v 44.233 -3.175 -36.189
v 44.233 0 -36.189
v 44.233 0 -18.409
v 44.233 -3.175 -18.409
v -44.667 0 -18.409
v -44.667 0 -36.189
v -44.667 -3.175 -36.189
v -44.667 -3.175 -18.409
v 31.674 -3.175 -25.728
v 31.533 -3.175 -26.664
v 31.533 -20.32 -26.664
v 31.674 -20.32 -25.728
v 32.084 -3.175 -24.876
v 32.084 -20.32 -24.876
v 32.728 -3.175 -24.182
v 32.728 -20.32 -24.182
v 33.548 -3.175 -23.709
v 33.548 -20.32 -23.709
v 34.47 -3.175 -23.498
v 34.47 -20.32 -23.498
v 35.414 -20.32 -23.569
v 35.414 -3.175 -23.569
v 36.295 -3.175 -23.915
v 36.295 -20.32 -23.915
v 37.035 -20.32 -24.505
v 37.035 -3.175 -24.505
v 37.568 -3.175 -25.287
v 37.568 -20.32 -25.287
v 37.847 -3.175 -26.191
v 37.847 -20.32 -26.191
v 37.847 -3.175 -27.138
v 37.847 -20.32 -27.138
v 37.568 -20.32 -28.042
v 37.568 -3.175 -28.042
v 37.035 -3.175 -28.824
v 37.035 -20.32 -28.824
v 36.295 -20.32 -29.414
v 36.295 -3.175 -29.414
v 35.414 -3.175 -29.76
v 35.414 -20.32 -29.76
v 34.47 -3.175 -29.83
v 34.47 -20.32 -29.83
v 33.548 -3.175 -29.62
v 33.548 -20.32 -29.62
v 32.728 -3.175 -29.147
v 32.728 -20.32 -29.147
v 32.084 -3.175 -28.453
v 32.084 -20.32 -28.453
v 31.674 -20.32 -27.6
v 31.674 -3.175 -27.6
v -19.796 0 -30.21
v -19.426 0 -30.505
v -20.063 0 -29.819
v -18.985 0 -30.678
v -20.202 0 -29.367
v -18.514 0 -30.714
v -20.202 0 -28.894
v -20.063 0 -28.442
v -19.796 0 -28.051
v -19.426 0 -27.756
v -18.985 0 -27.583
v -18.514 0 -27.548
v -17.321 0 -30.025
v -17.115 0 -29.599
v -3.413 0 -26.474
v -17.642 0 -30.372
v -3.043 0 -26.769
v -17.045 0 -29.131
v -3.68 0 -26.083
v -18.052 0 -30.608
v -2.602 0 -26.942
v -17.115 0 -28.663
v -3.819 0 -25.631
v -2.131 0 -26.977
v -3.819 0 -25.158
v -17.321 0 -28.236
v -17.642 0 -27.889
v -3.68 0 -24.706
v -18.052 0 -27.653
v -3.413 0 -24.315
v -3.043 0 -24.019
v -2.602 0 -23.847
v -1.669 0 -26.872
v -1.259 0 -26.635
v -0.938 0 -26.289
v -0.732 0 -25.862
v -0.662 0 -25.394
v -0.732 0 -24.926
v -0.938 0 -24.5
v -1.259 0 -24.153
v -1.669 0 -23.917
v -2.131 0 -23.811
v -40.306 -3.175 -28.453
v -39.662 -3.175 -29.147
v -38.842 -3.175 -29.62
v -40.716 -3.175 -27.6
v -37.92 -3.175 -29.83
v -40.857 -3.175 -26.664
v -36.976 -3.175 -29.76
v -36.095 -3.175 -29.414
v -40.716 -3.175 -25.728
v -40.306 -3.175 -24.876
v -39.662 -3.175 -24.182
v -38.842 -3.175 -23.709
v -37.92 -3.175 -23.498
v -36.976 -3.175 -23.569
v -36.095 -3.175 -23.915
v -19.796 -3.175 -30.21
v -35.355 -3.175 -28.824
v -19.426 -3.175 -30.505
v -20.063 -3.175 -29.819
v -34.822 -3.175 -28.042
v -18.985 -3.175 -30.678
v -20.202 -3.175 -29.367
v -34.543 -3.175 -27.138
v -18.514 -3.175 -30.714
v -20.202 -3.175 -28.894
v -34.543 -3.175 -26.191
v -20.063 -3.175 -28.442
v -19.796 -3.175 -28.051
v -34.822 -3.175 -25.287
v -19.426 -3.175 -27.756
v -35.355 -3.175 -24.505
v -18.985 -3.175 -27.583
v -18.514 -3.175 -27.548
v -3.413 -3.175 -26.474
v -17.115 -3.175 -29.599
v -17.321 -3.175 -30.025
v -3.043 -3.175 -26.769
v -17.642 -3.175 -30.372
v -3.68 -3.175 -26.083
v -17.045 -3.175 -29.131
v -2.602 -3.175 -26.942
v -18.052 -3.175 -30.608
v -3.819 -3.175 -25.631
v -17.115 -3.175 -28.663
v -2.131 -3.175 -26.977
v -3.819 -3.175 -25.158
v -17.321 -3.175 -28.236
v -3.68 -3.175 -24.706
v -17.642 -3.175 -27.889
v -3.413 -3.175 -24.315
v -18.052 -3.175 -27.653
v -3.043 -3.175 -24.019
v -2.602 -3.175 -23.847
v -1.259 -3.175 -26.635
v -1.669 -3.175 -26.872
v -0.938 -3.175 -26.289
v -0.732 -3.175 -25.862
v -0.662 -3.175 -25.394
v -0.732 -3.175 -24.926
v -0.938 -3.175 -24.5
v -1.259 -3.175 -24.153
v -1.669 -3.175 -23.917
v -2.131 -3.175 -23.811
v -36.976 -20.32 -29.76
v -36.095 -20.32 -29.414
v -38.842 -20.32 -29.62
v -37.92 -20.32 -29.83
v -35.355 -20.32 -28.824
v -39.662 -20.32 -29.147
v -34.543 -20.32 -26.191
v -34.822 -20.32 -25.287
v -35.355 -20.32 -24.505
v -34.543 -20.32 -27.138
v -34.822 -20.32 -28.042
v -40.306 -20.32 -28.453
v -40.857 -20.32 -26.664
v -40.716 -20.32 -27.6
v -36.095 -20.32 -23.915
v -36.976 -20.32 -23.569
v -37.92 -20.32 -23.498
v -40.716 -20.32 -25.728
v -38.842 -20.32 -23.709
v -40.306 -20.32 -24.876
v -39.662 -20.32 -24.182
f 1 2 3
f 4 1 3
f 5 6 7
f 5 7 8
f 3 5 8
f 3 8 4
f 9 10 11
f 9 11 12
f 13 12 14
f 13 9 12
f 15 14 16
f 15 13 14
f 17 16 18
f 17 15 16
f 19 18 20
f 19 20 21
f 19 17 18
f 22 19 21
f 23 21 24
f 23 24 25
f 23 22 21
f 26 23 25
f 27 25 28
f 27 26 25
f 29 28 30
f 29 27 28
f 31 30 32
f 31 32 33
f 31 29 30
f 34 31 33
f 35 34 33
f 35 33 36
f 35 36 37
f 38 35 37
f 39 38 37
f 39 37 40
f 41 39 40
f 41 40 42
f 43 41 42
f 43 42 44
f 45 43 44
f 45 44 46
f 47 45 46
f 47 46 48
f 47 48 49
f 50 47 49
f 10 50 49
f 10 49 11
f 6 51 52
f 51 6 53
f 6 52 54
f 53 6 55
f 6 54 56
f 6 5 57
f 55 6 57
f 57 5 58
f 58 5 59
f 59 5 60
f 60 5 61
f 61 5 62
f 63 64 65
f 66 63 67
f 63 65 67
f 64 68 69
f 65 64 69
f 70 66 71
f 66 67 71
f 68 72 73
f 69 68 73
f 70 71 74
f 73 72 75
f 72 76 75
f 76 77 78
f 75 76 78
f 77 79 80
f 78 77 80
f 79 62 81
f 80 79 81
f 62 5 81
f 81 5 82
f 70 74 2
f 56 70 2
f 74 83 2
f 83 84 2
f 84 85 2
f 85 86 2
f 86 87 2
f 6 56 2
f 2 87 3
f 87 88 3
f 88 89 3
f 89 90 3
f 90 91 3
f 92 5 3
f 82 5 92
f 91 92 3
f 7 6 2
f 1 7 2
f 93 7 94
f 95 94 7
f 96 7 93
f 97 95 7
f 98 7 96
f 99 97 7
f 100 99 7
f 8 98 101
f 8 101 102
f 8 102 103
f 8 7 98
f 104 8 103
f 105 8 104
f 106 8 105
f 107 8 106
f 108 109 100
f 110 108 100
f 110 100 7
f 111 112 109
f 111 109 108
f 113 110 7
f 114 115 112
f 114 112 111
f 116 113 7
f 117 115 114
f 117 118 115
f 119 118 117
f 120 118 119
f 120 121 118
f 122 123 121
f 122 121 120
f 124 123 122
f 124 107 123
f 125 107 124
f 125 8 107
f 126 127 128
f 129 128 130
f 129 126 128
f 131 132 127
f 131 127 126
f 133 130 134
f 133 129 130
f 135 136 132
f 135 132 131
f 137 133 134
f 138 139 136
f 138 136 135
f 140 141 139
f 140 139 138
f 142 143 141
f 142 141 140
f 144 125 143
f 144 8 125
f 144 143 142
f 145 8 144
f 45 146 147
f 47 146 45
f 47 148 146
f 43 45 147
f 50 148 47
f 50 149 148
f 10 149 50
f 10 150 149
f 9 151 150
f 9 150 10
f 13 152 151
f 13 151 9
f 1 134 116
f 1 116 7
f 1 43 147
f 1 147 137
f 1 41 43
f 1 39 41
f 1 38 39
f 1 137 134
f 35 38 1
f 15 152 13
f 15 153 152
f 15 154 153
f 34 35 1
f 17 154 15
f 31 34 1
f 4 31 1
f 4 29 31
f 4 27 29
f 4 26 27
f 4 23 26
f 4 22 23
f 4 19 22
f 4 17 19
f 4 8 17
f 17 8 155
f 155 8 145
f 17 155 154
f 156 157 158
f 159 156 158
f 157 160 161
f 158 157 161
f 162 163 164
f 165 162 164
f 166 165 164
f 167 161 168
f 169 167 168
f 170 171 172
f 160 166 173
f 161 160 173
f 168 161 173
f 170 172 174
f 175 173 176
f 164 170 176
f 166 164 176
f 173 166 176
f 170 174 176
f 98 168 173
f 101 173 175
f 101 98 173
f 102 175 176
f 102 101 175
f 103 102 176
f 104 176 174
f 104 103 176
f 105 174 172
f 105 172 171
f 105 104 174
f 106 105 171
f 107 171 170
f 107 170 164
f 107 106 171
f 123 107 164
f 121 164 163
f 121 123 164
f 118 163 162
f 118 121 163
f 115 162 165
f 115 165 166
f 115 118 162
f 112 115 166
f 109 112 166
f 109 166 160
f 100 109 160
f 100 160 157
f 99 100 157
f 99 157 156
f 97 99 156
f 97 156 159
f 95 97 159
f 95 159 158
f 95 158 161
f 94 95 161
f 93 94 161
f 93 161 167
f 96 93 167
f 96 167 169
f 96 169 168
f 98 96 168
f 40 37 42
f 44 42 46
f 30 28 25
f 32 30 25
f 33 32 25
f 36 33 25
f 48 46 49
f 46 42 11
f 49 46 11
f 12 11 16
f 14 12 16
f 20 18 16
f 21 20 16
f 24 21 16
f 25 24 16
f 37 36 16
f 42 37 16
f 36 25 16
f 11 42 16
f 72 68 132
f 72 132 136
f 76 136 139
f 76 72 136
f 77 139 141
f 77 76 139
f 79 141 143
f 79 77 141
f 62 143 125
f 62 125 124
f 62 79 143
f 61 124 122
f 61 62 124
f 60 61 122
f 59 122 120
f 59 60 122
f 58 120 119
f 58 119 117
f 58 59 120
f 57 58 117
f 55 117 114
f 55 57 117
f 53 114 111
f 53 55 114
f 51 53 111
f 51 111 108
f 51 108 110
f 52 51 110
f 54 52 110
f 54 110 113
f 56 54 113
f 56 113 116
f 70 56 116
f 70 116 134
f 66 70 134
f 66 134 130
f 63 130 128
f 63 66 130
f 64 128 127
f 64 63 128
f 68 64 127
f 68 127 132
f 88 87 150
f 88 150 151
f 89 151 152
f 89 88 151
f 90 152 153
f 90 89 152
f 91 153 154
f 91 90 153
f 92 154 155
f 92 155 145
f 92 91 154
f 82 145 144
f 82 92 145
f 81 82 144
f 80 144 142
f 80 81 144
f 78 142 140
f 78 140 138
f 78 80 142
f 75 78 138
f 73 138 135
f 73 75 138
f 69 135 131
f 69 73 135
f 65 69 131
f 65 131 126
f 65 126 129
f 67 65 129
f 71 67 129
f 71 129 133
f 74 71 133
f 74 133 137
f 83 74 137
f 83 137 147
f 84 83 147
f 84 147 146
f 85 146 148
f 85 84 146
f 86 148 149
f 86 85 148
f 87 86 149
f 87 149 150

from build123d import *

# Parameters (mm, degrees)
F0_W     = 88.9
F0_H     = 17.78
F0_R     = 1.5875
F0_R_2   = 3.175
F1_DEPTH = 3.175
F2_R     = 3.175
F3_DEPTH = 20.32


with BuildPart() as f1:
    # F0 (on Front) → F1 (new body)
    with BuildSketch(Plane.XZ):
        with Locations((-0.217237, -27.299299)):
            Rectangle(F0_W, F0_H)
        with Locations((-18.632237, -29.130639)):
            Circle(F0_R, mode=Mode.SUBTRACT)
        with Locations((-37.682237, -26.664299)):
            Circle(F0_R_2, mode=Mode.SUBTRACT)
        with Locations((-2.249237, -25.394299)):
            Circle(F0_R, mode=Mode.SUBTRACT)
        with Locations((34.707763, -26.664299)):
            Circle(F0_R_2, mode=Mode.SUBTRACT)
    extrude(amount=F1_DEPTH)

    # F2 (on face) → F3 (join)
    with BuildSketch(Plane(origin=(0, 0, 0), x_dir=(-1, 0, 0), z_dir=(0, 1, 0))):
        with Locations((-34.707763, -26.664299)):
            Circle(F2_R)
        with Locations((37.682237, -26.664299)):
            Circle(F2_R)
    extrude(amount=-F3_DEPTH)


solid = f1.part
